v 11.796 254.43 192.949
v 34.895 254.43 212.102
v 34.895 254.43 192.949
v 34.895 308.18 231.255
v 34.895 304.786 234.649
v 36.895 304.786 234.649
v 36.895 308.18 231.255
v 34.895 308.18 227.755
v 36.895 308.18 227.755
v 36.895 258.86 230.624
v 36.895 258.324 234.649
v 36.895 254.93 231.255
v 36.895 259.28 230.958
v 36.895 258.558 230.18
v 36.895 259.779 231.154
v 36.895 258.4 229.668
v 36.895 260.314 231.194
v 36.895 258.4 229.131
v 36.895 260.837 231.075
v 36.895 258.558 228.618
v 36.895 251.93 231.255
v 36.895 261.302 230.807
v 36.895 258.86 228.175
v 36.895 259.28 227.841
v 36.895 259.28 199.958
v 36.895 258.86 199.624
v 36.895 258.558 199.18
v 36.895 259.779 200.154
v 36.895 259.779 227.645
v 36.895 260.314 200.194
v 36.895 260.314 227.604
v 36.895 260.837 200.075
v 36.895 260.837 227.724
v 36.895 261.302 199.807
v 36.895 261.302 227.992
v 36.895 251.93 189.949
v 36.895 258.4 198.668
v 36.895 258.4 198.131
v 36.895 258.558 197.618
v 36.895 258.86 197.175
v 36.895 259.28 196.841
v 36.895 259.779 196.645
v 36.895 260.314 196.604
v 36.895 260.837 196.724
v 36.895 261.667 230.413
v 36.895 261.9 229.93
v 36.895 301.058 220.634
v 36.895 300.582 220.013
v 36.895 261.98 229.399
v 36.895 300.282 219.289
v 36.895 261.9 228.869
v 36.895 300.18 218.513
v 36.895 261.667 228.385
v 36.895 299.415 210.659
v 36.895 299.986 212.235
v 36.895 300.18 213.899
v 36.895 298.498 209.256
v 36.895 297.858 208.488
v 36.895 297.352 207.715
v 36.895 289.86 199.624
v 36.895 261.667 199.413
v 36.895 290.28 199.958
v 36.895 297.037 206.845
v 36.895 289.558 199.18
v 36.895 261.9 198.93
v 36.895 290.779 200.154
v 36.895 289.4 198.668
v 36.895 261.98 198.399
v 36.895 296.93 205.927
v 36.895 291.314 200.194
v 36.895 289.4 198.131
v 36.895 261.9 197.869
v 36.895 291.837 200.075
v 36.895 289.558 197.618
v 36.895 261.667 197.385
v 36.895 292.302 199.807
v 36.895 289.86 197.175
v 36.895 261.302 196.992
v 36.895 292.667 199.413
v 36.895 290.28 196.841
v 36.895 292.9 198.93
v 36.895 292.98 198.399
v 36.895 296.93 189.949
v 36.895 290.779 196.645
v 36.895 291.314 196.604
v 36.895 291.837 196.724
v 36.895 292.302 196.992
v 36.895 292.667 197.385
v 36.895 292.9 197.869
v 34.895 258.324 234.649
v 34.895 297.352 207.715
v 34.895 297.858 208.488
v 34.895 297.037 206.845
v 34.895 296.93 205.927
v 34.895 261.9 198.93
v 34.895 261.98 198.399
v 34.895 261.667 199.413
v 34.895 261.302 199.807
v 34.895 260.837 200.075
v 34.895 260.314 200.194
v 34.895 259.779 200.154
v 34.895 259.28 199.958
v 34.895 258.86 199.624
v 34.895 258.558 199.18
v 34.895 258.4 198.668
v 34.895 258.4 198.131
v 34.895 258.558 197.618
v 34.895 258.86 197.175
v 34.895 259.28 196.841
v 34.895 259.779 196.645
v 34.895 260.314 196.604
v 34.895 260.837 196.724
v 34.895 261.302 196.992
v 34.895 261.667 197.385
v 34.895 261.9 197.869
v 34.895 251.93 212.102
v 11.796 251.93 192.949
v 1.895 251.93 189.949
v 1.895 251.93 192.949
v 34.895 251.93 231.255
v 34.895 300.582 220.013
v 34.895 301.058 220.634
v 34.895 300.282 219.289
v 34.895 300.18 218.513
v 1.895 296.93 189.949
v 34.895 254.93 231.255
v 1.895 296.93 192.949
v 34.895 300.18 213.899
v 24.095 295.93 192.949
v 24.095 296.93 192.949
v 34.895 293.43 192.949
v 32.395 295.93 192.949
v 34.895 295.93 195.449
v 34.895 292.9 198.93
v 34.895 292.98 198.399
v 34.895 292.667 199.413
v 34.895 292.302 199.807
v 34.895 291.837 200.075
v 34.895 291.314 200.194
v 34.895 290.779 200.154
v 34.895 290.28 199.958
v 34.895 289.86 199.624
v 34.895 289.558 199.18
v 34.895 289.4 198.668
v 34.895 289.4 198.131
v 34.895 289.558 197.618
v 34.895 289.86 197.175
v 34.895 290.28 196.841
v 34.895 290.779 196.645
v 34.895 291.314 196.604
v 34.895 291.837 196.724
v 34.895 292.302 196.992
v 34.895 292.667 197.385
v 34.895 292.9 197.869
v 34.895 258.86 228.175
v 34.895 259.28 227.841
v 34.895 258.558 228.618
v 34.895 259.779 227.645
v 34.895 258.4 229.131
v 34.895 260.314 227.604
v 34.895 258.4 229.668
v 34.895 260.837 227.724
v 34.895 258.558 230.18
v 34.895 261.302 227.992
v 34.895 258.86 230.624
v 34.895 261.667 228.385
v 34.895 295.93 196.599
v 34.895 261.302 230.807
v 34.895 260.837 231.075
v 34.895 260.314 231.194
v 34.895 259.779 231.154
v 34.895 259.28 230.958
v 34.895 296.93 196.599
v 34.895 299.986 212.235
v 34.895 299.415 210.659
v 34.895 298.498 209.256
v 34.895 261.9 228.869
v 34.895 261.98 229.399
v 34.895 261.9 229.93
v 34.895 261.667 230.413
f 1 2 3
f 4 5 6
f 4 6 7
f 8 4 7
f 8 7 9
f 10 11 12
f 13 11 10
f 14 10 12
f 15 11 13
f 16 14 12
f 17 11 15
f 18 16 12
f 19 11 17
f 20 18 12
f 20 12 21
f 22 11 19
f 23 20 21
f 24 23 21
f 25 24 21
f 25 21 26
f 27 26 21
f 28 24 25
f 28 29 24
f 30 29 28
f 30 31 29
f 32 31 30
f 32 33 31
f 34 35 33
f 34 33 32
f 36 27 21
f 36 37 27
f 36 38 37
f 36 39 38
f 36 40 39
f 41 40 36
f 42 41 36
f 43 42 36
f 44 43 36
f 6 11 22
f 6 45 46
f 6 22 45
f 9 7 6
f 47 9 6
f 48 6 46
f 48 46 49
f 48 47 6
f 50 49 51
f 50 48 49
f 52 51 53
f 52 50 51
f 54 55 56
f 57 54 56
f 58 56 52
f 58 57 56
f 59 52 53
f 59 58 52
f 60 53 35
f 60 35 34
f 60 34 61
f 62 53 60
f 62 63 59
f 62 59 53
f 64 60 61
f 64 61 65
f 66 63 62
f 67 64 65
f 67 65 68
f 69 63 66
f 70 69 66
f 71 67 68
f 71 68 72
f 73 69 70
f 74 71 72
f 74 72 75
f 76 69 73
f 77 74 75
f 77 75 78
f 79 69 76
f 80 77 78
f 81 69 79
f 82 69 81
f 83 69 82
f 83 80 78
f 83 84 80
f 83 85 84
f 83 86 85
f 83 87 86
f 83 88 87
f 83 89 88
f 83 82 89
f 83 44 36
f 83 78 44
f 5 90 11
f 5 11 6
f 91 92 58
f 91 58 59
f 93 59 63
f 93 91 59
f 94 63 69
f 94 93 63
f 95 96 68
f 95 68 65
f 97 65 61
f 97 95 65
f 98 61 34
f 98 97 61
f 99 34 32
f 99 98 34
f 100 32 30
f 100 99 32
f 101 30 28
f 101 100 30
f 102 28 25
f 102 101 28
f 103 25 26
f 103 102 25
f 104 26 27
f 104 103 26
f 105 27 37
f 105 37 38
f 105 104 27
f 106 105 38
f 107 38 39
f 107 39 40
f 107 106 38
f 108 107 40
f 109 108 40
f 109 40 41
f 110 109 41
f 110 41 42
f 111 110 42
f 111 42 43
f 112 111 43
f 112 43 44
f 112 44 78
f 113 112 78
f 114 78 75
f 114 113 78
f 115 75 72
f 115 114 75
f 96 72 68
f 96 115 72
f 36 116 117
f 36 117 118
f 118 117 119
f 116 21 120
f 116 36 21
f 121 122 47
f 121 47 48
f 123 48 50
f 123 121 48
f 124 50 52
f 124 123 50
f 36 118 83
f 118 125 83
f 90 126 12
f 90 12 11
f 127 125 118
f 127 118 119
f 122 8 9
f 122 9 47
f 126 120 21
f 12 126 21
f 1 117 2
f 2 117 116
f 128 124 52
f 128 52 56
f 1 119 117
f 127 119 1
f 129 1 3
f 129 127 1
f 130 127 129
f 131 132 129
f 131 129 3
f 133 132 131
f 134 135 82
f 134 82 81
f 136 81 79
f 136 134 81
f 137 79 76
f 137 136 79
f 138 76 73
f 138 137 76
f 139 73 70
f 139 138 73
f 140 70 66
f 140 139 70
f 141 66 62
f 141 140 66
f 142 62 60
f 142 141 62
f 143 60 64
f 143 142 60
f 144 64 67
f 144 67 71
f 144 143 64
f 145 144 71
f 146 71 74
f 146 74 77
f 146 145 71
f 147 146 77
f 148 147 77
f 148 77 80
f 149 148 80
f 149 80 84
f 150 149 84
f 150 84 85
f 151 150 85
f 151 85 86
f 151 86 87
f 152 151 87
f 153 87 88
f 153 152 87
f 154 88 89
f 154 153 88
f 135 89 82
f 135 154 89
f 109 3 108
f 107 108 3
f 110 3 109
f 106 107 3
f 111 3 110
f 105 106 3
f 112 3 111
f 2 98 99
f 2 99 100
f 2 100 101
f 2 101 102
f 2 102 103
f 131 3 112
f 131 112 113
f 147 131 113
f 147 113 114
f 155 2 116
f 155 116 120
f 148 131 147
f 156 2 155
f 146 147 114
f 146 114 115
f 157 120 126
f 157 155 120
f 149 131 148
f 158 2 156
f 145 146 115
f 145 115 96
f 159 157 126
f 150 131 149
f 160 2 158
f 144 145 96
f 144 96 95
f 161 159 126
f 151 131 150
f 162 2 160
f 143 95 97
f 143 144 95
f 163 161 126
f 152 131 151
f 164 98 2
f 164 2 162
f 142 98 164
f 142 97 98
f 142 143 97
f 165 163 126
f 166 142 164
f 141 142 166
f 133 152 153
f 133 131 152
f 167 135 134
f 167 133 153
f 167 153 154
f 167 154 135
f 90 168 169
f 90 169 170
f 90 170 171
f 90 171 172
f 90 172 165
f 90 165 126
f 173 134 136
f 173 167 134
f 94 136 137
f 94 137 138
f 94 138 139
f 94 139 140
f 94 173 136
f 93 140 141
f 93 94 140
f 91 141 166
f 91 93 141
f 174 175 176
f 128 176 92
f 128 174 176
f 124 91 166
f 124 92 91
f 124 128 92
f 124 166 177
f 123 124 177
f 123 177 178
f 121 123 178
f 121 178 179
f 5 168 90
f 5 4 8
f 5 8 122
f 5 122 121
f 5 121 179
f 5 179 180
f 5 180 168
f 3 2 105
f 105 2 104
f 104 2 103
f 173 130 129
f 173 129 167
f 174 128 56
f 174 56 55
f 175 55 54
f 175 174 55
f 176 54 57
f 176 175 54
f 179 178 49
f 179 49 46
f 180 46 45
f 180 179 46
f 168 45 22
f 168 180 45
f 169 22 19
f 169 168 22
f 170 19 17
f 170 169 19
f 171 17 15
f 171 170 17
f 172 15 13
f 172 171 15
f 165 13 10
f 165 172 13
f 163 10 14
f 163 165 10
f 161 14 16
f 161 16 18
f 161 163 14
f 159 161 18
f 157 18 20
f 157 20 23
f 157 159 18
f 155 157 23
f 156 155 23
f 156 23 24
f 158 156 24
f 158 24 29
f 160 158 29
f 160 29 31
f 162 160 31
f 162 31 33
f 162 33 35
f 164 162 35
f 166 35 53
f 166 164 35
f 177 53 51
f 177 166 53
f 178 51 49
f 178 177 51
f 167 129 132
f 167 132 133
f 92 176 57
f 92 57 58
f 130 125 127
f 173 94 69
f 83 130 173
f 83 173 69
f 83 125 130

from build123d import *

# Parameters (mm, degrees)
SKETCH1_R                = 1.8
BOSS_EXTRUDE1_DEPTH      = 2
BOSS_EXTRUDE2_DEPTH      = 33
BOSS_EXTRUDE3_DEPTH      = 1
CHAMFER1_START           = 78.15897378
CHAMFER1_DEPTH           = 1.443375673
BOSS_EXTRUDE4_DEPTH      = 3
BOSS_EXTRUDE4_DEPTH_BACK = 0.0001
BOSS_EXTRUDE5_DEPTH      = 2.5
CUT_EXTRUDE1_DEPTH       = 3.0001


with BuildPart() as part:
    # Sketch1 → Boss-Extrude1 (new body)
    with BuildSketch(Plane(origin=(34.895003496, 0, 0), x_dir=(0, 0, -1), z_dir=(1, 0, 0))):
        with BuildLine():
            Line((-197.649446246, 296.929756404), (-189.949446246, 296.929756404))
            Line((-189.949446246, 296.929756404), (-189.949446246, 254.929756404))
            Line((-189.949446246, 254.929756404), (-196.543558796, 254.929756404))
            Line((-196.543558796, 254.929756404), (-231.255333696, 254.929756404))
            Line((-231.255333696, 254.929756404), (-234.649446246, 258.323868954))
            Line((-234.649446246, 258.323868954), (-234.649446246, 304.785643855))
            Line((-234.649446246, 304.785643855), (-231.255333696, 308.179756404))
            Line((-231.255333696, 308.179756404), (-227.755333696, 308.179756404))
            Line((-227.755333696, 308.179756404), (-224.361221147, 304.785643855))
            Line((-224.361221147, 304.785643855), (-220.634013353, 301.058436061))
            ThreePointArc((-220.634013353, 301.058436061), (-219.660743306, 300.408117807), (-218.512693009, 300.179756404))
            Line((-218.512693009, 300.179756404), (-213.899446246, 300.179756404))
            ThreePointArc((-213.899446246, 300.179756404), (-211.430377525, 299.74636844), (-209.256499056, 298.498018377))
            Line((-209.256499056, 298.498018377), (-208.488462922, 297.857611868))
            ThreePointArc((-208.488462922, 297.857611868), (-207.289081698, 297.168867005), (-205.926836886, 296.929756404))
            Line((-205.926836886, 296.929756404), (-197.649446246, 296.929756404))
        make_face()
        with Locations(Location((-198.399446246, 291.179756404, 0), (0, 0, 90))):
            Circle(SKETCH1_R, mode=Mode.SUBTRACT)
        with Locations(Location((-198.399446246, 260.179756404, 0), (0, 0, 90))):
            Circle(SKETCH1_R, mode=Mode.SUBTRACT)
        with Locations(Location((-229.399446246, 260.179756404, 0), (0, 0, 90))):
            Circle(SKETCH1_R, mode=Mode.SUBTRACT)
    extrude(amount=BOSS_EXTRUDE1_DEPTH)

    # Sketch2 → Boss-Extrude2 (add)
    with BuildSketch(Plane.ZY.offset(-34.895003496)):
        Polygon((192.949446246, 296.929756404), (192.949446246, 255.737509851), (192.949446246, 254.929756404), (189.949446246, 254.929756404), (189.949446246, 296.929756404), align=None)
    extrude(amount=BOSS_EXTRUDE2_DEPTH)

    # Sketch3 → Boss-Extrude3 (add)
    with BuildSketch(Plane(origin=(0, 296.929756404, 0), x_dir=(1, 0, 0), z_dir=(0, 1, 0))):
        Polygon((24.09465277, -192.949446246), (34.895003496, -196.599446246), (34.895003496, -192.949446246), align=None)
    extrude(amount=-BOSS_EXTRUDE3_DEPTH)

    # Chamfer1: read off the stored shape, not the designer's step
    # Chamfer1 outline → Chamfer1 (add)
    with BuildSketch(Plane(origin=(0, 0, 0), x_dir=(0.8164965809277265, -0.4082482904638619, 0.4082482904638633), z_dir=(0.5773502691896251, 0.5773502691896252, -0.5773502691896272)).offset(CHAMFER1_START)):
        Polygon((-15.59112598, -345.689799375), (-12.529263801, -347.457566328), (-12.529263801, -343.922032422), align=None)
    extrude(amount=CHAMFER1_DEPTH)

    # Sketch4 → Boss-Extrude4 (add, two sides: drawn at the far end of the back side and taken through both)
    with BuildSketch(Plane.XZ.offset(-254.929756404).offset(-BOSS_EXTRUDE4_DEPTH_BACK)):
        Polygon((1.895003496, 192.949446246), (34.895003496, 192.949446246), (34.895003496, 231.255333696), (36.895003496, 231.255333696), (36.895003496, 189.949446246), (1.895003496, 170.0501531), align=None)
    extrude(amount=BOSS_EXTRUDE4_DEPTH + BOSS_EXTRUDE4_DEPTH_BACK)

    # Sketch5 → Boss-Extrude5 (add)
    with BuildSketch(Plane.XZ.offset(-251.929756404)):
        Polygon((11.795887964, 192.949446246), (34.895003496, 212.102389971), (34.895003496, 192.949446246), align=None)
    extrude(amount=-BOSS_EXTRUDE5_DEPTH)

    # Sketch6 → Cut-Extrude1 (cut)
    with BuildSketch(Plane(origin=(0, 254.929856404, 0), x_dir=(1, 0, 0), z_dir=(0, 1, 0))):
        Polygon((1.895003496, -189.949446246), (36.895003496, -189.949446246), (1.895003496, -170.0501531), align=None)
    extrude(amount=-CUT_EXTRUDE1_DEPTH, mode=Mode.SUBTRACT)


solid = part.part
